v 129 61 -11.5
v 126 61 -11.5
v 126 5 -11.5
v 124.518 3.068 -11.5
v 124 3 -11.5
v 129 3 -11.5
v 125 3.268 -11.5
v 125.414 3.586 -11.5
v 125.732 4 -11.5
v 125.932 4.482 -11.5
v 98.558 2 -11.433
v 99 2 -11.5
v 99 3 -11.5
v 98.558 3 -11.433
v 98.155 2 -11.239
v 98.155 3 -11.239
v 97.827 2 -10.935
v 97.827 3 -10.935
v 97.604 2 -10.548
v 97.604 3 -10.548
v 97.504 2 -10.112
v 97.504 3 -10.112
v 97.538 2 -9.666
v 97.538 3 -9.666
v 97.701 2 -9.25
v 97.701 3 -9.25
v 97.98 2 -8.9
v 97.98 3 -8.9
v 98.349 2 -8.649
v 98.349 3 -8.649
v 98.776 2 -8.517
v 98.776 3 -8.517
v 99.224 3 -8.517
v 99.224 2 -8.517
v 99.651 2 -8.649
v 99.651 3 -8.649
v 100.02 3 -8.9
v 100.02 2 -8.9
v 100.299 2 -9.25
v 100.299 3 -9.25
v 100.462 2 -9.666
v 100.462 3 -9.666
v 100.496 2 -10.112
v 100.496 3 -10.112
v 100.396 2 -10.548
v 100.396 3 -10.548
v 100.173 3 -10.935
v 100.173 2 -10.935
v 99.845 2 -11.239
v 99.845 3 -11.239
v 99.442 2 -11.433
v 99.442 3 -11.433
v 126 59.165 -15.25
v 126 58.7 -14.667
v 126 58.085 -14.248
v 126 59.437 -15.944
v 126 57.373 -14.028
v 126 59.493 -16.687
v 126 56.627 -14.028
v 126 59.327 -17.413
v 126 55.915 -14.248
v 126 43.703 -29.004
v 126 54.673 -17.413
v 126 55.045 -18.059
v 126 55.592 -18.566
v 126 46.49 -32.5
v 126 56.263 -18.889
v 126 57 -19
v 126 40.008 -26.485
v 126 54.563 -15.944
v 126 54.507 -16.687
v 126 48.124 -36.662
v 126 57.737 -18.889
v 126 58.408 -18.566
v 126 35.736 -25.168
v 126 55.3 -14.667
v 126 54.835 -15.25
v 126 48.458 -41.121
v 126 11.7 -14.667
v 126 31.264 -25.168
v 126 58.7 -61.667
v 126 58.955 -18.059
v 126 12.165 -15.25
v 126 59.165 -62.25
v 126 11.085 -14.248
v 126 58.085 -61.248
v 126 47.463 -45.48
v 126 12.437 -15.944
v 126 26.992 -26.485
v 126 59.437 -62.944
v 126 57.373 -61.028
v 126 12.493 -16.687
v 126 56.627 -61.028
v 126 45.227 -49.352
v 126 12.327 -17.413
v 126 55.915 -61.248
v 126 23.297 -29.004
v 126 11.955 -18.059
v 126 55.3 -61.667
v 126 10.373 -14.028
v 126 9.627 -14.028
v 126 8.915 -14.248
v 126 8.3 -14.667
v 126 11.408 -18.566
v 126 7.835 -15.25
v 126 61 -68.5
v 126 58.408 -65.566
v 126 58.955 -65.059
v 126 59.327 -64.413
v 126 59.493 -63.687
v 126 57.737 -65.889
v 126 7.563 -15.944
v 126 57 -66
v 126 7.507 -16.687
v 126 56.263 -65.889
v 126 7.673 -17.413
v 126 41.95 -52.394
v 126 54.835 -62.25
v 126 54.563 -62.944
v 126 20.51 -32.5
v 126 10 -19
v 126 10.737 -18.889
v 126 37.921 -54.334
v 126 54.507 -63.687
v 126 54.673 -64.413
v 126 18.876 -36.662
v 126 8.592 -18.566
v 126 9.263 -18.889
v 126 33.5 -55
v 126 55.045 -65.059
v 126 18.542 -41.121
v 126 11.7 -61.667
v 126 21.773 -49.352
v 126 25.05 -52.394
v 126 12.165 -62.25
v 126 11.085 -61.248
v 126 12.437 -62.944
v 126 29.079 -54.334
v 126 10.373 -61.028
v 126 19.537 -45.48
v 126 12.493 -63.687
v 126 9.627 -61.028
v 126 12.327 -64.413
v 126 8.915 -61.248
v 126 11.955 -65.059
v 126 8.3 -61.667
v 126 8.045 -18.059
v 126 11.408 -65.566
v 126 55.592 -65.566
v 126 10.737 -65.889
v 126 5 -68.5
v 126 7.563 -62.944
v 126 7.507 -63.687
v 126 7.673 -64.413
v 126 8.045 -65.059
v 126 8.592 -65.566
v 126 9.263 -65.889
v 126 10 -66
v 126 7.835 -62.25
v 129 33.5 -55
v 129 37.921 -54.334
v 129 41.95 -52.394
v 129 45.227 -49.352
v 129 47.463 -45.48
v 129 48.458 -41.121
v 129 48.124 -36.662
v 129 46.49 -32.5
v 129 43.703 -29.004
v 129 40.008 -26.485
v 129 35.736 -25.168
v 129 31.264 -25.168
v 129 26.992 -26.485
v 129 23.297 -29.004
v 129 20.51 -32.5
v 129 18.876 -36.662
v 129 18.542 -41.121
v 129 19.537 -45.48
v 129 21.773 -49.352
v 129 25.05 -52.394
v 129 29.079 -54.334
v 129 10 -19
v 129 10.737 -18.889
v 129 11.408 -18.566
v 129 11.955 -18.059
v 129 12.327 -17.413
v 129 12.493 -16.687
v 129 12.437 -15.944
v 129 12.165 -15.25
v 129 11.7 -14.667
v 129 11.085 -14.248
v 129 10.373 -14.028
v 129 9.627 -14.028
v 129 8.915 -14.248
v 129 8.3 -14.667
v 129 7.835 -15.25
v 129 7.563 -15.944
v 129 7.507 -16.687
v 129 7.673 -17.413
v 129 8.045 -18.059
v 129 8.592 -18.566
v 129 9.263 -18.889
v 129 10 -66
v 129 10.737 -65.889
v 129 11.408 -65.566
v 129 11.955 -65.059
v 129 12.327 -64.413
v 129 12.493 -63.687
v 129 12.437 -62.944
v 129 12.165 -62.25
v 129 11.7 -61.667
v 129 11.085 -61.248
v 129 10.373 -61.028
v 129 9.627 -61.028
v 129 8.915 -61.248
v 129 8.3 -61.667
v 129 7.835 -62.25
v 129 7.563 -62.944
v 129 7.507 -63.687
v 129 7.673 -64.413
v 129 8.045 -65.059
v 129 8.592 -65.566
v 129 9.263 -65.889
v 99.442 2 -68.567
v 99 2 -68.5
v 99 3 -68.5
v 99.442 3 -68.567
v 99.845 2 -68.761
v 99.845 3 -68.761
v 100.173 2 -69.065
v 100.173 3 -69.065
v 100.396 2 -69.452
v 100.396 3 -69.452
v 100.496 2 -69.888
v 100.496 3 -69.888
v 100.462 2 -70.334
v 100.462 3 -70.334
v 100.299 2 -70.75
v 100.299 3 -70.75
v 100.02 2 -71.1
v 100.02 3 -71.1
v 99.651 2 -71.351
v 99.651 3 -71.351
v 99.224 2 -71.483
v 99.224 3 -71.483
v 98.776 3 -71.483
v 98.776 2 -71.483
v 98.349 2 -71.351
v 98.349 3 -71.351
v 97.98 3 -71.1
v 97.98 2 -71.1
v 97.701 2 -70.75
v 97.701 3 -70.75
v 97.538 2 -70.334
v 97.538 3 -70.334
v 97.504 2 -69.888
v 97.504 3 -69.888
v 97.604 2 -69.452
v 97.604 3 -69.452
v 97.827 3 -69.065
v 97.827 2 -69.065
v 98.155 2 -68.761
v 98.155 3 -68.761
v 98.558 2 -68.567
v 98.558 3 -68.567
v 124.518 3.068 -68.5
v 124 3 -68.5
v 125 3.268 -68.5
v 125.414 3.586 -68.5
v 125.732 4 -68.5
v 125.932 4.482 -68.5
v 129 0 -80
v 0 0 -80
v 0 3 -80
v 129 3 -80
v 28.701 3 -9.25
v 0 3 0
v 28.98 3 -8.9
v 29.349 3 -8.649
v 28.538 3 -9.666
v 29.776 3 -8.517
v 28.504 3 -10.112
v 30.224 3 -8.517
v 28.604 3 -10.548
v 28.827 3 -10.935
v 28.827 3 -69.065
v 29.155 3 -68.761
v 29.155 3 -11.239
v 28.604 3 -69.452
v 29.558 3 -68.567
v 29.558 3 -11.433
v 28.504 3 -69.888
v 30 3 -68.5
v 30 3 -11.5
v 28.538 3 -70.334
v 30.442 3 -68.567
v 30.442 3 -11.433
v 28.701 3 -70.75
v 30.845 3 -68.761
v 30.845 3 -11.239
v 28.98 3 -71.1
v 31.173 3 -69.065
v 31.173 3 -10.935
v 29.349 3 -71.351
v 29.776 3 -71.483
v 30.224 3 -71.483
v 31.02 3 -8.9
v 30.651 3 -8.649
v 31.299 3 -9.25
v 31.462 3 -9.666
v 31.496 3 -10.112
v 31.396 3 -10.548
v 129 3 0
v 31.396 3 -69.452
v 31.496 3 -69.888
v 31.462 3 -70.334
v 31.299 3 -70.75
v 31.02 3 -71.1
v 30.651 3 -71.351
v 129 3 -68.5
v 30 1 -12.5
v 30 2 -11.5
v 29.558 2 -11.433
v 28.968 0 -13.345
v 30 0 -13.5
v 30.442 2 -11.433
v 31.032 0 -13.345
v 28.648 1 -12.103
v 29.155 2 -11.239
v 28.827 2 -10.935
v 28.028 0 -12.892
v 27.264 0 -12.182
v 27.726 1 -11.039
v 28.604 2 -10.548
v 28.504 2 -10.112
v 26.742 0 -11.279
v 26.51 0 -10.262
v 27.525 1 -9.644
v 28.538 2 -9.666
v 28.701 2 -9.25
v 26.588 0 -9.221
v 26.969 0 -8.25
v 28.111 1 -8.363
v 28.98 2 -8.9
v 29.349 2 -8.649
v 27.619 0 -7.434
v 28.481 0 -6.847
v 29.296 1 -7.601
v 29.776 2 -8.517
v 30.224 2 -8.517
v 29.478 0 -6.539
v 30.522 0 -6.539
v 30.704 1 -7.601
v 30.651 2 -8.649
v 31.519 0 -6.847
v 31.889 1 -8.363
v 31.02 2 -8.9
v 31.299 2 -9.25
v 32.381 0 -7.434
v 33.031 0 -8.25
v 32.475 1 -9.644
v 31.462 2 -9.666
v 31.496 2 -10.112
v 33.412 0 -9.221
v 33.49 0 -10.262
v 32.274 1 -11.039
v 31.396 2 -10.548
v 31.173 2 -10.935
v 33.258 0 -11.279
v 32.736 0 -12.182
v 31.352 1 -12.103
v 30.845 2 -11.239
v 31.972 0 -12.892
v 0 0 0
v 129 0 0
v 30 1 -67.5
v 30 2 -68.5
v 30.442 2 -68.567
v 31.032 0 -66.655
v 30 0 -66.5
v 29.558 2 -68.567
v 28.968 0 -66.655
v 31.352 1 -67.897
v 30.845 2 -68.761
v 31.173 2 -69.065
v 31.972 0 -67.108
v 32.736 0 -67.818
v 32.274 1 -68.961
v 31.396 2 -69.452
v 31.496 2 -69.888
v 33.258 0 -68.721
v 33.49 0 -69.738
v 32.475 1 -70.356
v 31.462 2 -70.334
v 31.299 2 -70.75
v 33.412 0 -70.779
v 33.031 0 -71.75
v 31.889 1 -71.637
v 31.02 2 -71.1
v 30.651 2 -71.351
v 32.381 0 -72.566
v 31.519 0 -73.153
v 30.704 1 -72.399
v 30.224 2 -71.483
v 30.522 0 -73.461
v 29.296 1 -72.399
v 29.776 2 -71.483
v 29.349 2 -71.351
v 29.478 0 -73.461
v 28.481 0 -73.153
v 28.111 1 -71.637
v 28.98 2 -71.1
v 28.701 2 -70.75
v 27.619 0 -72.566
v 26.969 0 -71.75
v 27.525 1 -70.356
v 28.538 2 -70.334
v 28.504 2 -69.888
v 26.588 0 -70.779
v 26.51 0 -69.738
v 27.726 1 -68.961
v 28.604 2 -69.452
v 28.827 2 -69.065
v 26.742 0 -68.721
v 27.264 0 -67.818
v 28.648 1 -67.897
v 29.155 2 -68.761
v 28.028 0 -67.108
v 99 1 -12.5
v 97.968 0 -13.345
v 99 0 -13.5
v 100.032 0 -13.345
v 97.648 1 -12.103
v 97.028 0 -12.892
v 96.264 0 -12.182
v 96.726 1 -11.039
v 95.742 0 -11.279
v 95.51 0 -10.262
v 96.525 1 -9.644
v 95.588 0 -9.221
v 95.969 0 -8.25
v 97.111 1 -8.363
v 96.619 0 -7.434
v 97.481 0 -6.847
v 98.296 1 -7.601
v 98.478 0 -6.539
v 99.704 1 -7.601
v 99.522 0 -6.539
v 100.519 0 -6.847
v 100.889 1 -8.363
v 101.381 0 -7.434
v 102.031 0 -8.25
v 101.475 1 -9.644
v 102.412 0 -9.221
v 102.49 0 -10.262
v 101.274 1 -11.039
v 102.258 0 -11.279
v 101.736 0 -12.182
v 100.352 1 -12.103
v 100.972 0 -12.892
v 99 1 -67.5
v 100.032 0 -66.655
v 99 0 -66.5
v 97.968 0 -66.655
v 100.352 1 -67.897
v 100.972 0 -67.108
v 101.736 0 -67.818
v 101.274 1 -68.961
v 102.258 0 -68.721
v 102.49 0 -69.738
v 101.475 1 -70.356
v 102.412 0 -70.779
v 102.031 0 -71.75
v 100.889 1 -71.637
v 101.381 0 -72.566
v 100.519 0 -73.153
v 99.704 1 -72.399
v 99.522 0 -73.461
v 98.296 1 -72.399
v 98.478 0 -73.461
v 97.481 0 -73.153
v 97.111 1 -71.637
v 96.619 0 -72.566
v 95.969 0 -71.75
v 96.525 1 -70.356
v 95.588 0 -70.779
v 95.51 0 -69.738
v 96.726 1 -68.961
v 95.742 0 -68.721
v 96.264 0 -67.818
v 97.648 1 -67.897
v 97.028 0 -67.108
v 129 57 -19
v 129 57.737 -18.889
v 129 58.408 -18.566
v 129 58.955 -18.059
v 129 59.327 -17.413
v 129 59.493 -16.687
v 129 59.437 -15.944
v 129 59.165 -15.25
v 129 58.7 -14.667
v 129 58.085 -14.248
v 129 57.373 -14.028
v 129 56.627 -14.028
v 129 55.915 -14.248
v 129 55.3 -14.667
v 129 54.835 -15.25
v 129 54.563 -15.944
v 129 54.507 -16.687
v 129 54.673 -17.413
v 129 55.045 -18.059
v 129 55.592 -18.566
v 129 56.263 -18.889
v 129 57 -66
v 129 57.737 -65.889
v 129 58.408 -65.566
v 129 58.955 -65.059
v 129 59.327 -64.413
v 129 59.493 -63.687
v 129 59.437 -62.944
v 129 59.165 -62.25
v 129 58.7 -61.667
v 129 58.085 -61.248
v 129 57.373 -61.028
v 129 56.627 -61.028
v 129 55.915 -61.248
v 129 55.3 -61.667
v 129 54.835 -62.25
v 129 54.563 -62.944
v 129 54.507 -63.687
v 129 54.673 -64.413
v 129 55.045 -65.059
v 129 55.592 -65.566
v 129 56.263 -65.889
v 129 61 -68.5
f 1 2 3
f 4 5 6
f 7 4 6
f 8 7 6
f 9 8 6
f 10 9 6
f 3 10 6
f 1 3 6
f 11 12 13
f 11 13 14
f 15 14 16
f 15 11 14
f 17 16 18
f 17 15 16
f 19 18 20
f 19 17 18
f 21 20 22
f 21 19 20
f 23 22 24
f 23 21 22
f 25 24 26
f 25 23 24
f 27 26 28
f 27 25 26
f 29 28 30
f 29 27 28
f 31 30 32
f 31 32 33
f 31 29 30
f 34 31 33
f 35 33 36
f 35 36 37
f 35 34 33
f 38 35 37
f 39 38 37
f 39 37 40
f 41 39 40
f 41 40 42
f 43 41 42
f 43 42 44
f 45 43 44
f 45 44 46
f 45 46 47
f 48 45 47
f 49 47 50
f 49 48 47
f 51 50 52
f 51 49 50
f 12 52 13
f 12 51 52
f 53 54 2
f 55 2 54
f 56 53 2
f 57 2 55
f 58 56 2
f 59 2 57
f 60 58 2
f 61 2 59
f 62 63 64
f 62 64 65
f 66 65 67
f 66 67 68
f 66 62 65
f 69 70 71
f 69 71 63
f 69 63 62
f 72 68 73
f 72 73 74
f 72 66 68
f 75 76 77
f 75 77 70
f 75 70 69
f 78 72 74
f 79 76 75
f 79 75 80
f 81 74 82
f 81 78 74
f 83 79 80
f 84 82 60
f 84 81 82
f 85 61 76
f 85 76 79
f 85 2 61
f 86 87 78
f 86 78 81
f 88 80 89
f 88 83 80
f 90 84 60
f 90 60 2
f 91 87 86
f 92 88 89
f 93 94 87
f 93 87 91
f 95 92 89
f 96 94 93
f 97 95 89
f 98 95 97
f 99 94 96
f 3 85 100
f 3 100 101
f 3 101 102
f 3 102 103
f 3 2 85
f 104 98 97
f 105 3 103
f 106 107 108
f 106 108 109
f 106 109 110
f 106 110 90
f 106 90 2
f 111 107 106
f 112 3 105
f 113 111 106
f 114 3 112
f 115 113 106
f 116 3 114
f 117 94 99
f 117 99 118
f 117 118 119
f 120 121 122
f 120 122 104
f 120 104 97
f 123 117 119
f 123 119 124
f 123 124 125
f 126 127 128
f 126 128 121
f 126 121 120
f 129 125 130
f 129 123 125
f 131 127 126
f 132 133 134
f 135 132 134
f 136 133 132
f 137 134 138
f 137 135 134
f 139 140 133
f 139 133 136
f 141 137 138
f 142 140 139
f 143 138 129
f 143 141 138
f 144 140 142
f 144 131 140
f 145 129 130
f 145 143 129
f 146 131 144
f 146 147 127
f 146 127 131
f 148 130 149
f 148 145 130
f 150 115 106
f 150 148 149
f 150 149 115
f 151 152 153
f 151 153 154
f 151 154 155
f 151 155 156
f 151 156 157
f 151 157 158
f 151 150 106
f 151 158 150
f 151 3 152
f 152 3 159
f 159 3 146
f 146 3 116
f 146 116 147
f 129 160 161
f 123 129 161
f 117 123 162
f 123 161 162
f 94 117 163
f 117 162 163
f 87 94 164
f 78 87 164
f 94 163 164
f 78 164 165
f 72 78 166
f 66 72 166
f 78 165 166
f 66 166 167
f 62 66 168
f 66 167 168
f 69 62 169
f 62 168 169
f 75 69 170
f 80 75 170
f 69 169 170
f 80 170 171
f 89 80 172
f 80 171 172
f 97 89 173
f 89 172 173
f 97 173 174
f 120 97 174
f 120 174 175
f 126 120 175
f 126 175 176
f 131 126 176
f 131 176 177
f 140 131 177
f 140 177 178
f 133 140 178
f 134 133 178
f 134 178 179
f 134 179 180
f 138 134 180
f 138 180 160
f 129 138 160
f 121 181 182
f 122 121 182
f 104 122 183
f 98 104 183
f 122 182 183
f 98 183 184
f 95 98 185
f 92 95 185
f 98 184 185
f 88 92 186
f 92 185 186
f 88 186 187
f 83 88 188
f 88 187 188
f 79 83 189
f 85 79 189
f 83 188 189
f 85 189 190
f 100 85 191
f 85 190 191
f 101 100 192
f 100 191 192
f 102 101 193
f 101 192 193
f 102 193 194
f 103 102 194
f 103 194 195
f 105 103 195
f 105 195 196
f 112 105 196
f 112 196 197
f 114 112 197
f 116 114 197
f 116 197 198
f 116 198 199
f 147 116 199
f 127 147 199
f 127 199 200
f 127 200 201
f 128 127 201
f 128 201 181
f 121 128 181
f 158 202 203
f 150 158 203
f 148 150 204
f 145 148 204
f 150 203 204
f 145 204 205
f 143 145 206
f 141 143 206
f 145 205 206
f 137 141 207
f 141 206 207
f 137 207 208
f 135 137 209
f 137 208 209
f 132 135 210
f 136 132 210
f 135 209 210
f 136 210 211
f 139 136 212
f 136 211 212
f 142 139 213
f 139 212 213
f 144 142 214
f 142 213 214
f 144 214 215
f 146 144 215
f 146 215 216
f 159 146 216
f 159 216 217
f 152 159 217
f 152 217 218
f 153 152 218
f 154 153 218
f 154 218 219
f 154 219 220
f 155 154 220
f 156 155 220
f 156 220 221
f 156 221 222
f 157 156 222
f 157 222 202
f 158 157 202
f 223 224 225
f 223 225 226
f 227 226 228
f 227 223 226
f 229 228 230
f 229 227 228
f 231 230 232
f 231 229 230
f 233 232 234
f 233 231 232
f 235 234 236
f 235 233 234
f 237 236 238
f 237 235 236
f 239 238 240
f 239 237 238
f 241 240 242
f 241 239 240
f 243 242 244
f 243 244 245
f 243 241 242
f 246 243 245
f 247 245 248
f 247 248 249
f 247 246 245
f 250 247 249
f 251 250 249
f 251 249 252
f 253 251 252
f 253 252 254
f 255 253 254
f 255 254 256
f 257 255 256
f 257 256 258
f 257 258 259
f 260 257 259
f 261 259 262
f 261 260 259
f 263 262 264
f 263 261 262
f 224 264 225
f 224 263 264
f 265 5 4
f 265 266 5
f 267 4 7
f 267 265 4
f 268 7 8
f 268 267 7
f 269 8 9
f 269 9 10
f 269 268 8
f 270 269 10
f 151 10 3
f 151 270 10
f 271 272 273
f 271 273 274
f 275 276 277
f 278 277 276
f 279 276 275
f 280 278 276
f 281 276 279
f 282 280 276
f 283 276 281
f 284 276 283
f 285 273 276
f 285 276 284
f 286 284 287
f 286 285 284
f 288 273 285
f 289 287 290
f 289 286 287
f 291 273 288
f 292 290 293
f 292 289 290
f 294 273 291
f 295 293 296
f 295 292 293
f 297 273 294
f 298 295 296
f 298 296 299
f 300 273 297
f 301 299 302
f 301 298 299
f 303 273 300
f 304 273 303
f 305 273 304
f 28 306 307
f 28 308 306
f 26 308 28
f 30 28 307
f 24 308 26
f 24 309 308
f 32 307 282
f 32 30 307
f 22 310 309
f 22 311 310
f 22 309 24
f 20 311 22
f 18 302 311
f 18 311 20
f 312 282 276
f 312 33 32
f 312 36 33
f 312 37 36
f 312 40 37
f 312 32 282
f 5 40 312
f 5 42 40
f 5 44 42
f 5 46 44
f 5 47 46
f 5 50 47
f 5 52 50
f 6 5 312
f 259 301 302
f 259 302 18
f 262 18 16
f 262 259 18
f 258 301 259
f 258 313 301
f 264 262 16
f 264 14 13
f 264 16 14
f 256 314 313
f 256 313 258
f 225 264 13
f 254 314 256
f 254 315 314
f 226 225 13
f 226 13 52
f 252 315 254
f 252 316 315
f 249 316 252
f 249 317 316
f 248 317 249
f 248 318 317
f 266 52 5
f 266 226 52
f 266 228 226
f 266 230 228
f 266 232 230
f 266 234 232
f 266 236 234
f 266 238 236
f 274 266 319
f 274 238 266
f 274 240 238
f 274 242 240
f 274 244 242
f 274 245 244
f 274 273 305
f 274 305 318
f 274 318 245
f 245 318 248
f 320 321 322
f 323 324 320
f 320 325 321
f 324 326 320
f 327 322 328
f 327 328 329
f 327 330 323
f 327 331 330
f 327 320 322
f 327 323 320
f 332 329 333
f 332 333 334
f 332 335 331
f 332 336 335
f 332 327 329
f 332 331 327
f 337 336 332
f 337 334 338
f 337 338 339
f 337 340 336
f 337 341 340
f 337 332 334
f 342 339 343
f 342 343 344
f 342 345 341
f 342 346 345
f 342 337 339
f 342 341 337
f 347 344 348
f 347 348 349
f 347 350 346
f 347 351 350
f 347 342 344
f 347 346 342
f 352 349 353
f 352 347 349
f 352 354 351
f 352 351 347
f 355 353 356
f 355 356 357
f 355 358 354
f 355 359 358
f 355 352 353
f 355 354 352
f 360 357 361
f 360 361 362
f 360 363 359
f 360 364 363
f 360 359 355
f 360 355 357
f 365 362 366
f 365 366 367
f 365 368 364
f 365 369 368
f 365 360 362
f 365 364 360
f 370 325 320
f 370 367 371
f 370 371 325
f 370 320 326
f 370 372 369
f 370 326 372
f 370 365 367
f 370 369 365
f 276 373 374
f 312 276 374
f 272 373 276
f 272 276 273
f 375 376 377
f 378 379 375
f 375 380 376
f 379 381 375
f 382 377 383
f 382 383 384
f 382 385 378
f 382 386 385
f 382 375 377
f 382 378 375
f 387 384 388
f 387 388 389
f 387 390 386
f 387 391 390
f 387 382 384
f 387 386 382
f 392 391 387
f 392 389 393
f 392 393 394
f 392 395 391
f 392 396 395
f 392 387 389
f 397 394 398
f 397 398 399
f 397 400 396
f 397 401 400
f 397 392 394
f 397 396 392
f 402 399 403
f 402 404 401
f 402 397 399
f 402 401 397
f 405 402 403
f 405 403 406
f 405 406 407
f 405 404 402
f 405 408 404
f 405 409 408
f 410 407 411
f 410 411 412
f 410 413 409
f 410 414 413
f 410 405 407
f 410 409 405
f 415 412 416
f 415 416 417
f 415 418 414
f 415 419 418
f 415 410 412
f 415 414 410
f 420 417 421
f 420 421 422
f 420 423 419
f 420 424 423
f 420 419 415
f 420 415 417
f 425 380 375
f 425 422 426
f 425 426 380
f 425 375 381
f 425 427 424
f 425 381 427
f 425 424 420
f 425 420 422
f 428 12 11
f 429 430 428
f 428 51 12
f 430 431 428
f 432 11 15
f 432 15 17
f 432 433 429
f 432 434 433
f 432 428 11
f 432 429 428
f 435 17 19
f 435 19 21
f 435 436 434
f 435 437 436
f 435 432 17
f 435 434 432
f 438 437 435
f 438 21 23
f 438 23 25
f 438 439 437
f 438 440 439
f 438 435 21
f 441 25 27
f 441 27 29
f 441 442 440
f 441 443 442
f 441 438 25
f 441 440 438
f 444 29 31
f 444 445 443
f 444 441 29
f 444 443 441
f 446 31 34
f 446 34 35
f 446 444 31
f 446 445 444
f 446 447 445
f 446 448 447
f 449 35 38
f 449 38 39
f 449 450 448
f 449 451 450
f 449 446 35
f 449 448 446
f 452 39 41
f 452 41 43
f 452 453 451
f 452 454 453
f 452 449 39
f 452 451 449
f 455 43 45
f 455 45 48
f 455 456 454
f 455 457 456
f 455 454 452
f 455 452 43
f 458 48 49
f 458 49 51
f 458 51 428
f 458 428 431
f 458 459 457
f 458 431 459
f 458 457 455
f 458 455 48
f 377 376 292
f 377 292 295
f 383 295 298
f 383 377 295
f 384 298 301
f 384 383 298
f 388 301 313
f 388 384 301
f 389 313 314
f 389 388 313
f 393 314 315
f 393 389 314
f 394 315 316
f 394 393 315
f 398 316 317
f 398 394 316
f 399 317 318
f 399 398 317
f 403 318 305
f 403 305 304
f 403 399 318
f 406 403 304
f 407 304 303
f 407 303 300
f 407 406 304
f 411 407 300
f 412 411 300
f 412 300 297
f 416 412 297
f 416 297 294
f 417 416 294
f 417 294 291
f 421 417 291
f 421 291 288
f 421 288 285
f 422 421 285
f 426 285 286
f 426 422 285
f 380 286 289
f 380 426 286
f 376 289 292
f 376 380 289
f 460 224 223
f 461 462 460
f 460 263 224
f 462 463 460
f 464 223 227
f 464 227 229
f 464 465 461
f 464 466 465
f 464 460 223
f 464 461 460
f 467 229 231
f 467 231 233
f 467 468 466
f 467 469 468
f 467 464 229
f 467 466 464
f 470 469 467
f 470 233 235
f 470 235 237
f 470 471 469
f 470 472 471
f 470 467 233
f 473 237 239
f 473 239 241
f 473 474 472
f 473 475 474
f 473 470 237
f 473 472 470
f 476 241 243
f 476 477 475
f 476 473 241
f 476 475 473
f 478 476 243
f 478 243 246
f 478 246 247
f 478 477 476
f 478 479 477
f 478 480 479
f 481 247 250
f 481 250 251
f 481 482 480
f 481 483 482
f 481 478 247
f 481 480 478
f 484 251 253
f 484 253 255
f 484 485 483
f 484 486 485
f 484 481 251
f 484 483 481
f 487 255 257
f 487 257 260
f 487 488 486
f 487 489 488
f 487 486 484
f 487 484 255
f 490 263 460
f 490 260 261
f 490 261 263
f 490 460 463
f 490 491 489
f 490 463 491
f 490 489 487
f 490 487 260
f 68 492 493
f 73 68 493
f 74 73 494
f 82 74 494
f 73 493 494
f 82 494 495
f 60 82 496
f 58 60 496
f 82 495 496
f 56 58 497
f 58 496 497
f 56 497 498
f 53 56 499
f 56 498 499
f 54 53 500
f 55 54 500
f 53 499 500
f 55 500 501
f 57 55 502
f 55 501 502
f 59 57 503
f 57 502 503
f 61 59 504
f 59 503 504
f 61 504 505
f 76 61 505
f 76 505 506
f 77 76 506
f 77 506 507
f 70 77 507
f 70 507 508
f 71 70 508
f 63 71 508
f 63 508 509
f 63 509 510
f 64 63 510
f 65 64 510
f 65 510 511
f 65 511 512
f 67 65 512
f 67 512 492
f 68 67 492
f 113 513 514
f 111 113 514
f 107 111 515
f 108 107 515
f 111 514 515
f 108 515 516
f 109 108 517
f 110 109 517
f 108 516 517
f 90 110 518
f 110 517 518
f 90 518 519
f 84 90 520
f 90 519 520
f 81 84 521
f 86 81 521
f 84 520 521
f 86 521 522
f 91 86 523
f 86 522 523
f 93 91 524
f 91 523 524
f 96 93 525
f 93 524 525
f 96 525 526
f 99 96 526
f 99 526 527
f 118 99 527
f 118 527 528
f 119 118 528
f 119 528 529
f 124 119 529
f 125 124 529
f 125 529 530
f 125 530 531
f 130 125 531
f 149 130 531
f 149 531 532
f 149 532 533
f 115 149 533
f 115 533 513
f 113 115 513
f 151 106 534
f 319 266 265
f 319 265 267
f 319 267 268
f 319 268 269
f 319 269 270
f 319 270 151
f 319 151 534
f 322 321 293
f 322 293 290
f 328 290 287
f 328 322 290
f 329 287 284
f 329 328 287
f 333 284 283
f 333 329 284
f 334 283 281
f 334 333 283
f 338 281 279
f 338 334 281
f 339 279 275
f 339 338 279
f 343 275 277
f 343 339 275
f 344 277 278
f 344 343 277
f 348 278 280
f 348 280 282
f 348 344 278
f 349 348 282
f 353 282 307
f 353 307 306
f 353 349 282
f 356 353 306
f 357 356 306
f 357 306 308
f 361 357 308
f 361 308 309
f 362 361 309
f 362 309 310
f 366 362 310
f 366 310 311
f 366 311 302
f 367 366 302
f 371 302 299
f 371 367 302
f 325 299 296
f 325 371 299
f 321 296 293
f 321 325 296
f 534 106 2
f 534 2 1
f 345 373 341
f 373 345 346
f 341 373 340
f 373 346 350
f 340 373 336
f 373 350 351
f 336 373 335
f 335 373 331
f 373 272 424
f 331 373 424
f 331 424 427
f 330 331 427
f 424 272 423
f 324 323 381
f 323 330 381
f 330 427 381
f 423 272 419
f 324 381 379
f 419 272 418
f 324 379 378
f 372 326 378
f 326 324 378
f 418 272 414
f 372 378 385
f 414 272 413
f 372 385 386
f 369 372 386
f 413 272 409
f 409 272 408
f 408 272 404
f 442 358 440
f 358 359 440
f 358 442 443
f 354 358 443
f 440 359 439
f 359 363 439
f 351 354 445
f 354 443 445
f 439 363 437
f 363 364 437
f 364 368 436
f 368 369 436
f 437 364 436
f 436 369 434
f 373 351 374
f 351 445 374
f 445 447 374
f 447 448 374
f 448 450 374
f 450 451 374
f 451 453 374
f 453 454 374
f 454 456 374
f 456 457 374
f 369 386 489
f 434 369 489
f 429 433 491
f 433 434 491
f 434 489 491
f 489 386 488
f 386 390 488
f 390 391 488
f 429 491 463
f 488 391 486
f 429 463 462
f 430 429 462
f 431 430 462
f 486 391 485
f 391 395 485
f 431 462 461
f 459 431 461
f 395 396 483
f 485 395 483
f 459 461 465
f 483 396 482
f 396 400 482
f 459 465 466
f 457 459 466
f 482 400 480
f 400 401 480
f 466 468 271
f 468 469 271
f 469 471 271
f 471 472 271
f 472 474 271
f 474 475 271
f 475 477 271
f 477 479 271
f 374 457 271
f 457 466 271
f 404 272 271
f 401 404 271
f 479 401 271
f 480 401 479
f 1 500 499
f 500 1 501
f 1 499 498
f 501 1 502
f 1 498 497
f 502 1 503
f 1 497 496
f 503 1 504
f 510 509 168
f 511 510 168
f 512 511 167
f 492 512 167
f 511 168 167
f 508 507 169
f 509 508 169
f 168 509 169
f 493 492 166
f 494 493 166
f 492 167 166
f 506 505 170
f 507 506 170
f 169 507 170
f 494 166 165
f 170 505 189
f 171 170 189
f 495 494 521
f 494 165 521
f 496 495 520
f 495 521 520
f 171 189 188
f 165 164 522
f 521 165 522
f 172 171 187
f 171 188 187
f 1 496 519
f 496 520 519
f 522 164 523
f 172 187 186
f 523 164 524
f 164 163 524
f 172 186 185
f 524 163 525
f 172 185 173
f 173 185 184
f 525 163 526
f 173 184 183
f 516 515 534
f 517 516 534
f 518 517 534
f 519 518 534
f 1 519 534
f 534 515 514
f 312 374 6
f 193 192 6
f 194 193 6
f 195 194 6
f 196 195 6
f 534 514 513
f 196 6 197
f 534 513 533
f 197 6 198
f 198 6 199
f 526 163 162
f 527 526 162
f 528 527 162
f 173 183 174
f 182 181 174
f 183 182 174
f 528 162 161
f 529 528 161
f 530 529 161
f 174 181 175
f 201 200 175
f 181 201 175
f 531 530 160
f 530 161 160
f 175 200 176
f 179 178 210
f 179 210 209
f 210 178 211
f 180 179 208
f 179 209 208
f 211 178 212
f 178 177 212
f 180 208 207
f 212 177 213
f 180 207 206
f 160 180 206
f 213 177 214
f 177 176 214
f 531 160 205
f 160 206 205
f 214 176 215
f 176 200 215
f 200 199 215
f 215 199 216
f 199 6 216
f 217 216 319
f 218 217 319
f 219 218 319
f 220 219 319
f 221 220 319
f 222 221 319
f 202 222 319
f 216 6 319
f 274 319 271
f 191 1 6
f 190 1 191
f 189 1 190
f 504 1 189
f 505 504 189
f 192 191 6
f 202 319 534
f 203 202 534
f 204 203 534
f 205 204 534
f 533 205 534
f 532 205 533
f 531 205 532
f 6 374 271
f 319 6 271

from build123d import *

# Parameters (mm, degrees)
SKETCH1_W           = 129
SKETCH1_H           = 80
SKETCH1_R           = 1.5
BOSS_EXTRUDE1_DEPTH = 3
SKETCH2_W           = 3
SKETCH2_H           = 57
BOSS_EXTRUDE2_DEPTH = 58
FILLET1_R           = 2
SKETCH3_R           = 2.5
SKETCH3_R_2         = 15
CUT_EXTRUDE1_DEPTH  = 164.590953295
CHAMFER3_SIZE       = 2


with BuildPart() as part:
    # Sketch1 → Boss-Extrude1 (new body)
    with BuildSketch(Plane(origin=(0, 0, 0), x_dir=(1, 0, 0), z_dir=(0, 1, 0))):
        with Locations((64.5, 40)):
            Rectangle(SKETCH1_W, SKETCH1_H)
        with Locations(Location((99, 70, 0), (0, 0, 270))):
            Circle(SKETCH1_R, mode=Mode.SUBTRACT)
        with Locations(Location((30, 70, 0), (0, 0, 270))):
            Circle(SKETCH1_R, mode=Mode.SUBTRACT)
        with Locations(Location((99, 10, 0), (0, 0, 90))):
            Circle(SKETCH1_R, mode=Mode.SUBTRACT)
        with Locations(Location((30, 10, 0), (0, 0, 90))):
            Circle(SKETCH1_R, mode=Mode.SUBTRACT)
    extrude(amount=BOSS_EXTRUDE1_DEPTH)

    # Sketch2 → Boss-Extrude2 (add)
    with BuildSketch(Plane(origin=(0, 3, 0), x_dir=(1, 0, 0), z_dir=(0, 1, 0))):
        with Locations((127.5, 40)):
            Rectangle(SKETCH2_W, SKETCH2_H)
    extrude(amount=BOSS_EXTRUDE2_DEPTH)

    # Fillet1
    fillet1_edges = [part.edges().sort_by_distance(p)[0] for p in [
        (126, 3, -40),
    ]]
    fillet(fillet1_edges, radius=FILLET1_R)

    # Sketch3 → Cut-Extrude1 (cut, through all)
    with BuildSketch(Plane(origin=(129, 0, 0), x_dir=(0, 0, -1), z_dir=(1, 0, 0))):
        with Locations((16.5, 57)):
            Circle(SKETCH3_R)
        with Locations((40, 33.5)):
            Circle(SKETCH3_R_2)
        with Locations((63.5, 57)):
            Circle(SKETCH3_R)
        with Locations((16.5, 10)):
            Circle(SKETCH3_R)
        with Locations((63.5, 10)):
            Circle(SKETCH3_R)
    extrude(amount=-CUT_EXTRUDE1_DEPTH, mode=Mode.SUBTRACT)

    # Chamfer3
    chamfer3_edges = [part.edges().sort_by_distance(p)[0] for p in [
        (99, 0, -71.5),
        (30, 0, -71.5),
        (99, 0, -8.5),
        (30, 0, -8.5),
    ]]
    chamfer(chamfer3_edges, length=CHAMFER3_SIZE)


solid = part.part
